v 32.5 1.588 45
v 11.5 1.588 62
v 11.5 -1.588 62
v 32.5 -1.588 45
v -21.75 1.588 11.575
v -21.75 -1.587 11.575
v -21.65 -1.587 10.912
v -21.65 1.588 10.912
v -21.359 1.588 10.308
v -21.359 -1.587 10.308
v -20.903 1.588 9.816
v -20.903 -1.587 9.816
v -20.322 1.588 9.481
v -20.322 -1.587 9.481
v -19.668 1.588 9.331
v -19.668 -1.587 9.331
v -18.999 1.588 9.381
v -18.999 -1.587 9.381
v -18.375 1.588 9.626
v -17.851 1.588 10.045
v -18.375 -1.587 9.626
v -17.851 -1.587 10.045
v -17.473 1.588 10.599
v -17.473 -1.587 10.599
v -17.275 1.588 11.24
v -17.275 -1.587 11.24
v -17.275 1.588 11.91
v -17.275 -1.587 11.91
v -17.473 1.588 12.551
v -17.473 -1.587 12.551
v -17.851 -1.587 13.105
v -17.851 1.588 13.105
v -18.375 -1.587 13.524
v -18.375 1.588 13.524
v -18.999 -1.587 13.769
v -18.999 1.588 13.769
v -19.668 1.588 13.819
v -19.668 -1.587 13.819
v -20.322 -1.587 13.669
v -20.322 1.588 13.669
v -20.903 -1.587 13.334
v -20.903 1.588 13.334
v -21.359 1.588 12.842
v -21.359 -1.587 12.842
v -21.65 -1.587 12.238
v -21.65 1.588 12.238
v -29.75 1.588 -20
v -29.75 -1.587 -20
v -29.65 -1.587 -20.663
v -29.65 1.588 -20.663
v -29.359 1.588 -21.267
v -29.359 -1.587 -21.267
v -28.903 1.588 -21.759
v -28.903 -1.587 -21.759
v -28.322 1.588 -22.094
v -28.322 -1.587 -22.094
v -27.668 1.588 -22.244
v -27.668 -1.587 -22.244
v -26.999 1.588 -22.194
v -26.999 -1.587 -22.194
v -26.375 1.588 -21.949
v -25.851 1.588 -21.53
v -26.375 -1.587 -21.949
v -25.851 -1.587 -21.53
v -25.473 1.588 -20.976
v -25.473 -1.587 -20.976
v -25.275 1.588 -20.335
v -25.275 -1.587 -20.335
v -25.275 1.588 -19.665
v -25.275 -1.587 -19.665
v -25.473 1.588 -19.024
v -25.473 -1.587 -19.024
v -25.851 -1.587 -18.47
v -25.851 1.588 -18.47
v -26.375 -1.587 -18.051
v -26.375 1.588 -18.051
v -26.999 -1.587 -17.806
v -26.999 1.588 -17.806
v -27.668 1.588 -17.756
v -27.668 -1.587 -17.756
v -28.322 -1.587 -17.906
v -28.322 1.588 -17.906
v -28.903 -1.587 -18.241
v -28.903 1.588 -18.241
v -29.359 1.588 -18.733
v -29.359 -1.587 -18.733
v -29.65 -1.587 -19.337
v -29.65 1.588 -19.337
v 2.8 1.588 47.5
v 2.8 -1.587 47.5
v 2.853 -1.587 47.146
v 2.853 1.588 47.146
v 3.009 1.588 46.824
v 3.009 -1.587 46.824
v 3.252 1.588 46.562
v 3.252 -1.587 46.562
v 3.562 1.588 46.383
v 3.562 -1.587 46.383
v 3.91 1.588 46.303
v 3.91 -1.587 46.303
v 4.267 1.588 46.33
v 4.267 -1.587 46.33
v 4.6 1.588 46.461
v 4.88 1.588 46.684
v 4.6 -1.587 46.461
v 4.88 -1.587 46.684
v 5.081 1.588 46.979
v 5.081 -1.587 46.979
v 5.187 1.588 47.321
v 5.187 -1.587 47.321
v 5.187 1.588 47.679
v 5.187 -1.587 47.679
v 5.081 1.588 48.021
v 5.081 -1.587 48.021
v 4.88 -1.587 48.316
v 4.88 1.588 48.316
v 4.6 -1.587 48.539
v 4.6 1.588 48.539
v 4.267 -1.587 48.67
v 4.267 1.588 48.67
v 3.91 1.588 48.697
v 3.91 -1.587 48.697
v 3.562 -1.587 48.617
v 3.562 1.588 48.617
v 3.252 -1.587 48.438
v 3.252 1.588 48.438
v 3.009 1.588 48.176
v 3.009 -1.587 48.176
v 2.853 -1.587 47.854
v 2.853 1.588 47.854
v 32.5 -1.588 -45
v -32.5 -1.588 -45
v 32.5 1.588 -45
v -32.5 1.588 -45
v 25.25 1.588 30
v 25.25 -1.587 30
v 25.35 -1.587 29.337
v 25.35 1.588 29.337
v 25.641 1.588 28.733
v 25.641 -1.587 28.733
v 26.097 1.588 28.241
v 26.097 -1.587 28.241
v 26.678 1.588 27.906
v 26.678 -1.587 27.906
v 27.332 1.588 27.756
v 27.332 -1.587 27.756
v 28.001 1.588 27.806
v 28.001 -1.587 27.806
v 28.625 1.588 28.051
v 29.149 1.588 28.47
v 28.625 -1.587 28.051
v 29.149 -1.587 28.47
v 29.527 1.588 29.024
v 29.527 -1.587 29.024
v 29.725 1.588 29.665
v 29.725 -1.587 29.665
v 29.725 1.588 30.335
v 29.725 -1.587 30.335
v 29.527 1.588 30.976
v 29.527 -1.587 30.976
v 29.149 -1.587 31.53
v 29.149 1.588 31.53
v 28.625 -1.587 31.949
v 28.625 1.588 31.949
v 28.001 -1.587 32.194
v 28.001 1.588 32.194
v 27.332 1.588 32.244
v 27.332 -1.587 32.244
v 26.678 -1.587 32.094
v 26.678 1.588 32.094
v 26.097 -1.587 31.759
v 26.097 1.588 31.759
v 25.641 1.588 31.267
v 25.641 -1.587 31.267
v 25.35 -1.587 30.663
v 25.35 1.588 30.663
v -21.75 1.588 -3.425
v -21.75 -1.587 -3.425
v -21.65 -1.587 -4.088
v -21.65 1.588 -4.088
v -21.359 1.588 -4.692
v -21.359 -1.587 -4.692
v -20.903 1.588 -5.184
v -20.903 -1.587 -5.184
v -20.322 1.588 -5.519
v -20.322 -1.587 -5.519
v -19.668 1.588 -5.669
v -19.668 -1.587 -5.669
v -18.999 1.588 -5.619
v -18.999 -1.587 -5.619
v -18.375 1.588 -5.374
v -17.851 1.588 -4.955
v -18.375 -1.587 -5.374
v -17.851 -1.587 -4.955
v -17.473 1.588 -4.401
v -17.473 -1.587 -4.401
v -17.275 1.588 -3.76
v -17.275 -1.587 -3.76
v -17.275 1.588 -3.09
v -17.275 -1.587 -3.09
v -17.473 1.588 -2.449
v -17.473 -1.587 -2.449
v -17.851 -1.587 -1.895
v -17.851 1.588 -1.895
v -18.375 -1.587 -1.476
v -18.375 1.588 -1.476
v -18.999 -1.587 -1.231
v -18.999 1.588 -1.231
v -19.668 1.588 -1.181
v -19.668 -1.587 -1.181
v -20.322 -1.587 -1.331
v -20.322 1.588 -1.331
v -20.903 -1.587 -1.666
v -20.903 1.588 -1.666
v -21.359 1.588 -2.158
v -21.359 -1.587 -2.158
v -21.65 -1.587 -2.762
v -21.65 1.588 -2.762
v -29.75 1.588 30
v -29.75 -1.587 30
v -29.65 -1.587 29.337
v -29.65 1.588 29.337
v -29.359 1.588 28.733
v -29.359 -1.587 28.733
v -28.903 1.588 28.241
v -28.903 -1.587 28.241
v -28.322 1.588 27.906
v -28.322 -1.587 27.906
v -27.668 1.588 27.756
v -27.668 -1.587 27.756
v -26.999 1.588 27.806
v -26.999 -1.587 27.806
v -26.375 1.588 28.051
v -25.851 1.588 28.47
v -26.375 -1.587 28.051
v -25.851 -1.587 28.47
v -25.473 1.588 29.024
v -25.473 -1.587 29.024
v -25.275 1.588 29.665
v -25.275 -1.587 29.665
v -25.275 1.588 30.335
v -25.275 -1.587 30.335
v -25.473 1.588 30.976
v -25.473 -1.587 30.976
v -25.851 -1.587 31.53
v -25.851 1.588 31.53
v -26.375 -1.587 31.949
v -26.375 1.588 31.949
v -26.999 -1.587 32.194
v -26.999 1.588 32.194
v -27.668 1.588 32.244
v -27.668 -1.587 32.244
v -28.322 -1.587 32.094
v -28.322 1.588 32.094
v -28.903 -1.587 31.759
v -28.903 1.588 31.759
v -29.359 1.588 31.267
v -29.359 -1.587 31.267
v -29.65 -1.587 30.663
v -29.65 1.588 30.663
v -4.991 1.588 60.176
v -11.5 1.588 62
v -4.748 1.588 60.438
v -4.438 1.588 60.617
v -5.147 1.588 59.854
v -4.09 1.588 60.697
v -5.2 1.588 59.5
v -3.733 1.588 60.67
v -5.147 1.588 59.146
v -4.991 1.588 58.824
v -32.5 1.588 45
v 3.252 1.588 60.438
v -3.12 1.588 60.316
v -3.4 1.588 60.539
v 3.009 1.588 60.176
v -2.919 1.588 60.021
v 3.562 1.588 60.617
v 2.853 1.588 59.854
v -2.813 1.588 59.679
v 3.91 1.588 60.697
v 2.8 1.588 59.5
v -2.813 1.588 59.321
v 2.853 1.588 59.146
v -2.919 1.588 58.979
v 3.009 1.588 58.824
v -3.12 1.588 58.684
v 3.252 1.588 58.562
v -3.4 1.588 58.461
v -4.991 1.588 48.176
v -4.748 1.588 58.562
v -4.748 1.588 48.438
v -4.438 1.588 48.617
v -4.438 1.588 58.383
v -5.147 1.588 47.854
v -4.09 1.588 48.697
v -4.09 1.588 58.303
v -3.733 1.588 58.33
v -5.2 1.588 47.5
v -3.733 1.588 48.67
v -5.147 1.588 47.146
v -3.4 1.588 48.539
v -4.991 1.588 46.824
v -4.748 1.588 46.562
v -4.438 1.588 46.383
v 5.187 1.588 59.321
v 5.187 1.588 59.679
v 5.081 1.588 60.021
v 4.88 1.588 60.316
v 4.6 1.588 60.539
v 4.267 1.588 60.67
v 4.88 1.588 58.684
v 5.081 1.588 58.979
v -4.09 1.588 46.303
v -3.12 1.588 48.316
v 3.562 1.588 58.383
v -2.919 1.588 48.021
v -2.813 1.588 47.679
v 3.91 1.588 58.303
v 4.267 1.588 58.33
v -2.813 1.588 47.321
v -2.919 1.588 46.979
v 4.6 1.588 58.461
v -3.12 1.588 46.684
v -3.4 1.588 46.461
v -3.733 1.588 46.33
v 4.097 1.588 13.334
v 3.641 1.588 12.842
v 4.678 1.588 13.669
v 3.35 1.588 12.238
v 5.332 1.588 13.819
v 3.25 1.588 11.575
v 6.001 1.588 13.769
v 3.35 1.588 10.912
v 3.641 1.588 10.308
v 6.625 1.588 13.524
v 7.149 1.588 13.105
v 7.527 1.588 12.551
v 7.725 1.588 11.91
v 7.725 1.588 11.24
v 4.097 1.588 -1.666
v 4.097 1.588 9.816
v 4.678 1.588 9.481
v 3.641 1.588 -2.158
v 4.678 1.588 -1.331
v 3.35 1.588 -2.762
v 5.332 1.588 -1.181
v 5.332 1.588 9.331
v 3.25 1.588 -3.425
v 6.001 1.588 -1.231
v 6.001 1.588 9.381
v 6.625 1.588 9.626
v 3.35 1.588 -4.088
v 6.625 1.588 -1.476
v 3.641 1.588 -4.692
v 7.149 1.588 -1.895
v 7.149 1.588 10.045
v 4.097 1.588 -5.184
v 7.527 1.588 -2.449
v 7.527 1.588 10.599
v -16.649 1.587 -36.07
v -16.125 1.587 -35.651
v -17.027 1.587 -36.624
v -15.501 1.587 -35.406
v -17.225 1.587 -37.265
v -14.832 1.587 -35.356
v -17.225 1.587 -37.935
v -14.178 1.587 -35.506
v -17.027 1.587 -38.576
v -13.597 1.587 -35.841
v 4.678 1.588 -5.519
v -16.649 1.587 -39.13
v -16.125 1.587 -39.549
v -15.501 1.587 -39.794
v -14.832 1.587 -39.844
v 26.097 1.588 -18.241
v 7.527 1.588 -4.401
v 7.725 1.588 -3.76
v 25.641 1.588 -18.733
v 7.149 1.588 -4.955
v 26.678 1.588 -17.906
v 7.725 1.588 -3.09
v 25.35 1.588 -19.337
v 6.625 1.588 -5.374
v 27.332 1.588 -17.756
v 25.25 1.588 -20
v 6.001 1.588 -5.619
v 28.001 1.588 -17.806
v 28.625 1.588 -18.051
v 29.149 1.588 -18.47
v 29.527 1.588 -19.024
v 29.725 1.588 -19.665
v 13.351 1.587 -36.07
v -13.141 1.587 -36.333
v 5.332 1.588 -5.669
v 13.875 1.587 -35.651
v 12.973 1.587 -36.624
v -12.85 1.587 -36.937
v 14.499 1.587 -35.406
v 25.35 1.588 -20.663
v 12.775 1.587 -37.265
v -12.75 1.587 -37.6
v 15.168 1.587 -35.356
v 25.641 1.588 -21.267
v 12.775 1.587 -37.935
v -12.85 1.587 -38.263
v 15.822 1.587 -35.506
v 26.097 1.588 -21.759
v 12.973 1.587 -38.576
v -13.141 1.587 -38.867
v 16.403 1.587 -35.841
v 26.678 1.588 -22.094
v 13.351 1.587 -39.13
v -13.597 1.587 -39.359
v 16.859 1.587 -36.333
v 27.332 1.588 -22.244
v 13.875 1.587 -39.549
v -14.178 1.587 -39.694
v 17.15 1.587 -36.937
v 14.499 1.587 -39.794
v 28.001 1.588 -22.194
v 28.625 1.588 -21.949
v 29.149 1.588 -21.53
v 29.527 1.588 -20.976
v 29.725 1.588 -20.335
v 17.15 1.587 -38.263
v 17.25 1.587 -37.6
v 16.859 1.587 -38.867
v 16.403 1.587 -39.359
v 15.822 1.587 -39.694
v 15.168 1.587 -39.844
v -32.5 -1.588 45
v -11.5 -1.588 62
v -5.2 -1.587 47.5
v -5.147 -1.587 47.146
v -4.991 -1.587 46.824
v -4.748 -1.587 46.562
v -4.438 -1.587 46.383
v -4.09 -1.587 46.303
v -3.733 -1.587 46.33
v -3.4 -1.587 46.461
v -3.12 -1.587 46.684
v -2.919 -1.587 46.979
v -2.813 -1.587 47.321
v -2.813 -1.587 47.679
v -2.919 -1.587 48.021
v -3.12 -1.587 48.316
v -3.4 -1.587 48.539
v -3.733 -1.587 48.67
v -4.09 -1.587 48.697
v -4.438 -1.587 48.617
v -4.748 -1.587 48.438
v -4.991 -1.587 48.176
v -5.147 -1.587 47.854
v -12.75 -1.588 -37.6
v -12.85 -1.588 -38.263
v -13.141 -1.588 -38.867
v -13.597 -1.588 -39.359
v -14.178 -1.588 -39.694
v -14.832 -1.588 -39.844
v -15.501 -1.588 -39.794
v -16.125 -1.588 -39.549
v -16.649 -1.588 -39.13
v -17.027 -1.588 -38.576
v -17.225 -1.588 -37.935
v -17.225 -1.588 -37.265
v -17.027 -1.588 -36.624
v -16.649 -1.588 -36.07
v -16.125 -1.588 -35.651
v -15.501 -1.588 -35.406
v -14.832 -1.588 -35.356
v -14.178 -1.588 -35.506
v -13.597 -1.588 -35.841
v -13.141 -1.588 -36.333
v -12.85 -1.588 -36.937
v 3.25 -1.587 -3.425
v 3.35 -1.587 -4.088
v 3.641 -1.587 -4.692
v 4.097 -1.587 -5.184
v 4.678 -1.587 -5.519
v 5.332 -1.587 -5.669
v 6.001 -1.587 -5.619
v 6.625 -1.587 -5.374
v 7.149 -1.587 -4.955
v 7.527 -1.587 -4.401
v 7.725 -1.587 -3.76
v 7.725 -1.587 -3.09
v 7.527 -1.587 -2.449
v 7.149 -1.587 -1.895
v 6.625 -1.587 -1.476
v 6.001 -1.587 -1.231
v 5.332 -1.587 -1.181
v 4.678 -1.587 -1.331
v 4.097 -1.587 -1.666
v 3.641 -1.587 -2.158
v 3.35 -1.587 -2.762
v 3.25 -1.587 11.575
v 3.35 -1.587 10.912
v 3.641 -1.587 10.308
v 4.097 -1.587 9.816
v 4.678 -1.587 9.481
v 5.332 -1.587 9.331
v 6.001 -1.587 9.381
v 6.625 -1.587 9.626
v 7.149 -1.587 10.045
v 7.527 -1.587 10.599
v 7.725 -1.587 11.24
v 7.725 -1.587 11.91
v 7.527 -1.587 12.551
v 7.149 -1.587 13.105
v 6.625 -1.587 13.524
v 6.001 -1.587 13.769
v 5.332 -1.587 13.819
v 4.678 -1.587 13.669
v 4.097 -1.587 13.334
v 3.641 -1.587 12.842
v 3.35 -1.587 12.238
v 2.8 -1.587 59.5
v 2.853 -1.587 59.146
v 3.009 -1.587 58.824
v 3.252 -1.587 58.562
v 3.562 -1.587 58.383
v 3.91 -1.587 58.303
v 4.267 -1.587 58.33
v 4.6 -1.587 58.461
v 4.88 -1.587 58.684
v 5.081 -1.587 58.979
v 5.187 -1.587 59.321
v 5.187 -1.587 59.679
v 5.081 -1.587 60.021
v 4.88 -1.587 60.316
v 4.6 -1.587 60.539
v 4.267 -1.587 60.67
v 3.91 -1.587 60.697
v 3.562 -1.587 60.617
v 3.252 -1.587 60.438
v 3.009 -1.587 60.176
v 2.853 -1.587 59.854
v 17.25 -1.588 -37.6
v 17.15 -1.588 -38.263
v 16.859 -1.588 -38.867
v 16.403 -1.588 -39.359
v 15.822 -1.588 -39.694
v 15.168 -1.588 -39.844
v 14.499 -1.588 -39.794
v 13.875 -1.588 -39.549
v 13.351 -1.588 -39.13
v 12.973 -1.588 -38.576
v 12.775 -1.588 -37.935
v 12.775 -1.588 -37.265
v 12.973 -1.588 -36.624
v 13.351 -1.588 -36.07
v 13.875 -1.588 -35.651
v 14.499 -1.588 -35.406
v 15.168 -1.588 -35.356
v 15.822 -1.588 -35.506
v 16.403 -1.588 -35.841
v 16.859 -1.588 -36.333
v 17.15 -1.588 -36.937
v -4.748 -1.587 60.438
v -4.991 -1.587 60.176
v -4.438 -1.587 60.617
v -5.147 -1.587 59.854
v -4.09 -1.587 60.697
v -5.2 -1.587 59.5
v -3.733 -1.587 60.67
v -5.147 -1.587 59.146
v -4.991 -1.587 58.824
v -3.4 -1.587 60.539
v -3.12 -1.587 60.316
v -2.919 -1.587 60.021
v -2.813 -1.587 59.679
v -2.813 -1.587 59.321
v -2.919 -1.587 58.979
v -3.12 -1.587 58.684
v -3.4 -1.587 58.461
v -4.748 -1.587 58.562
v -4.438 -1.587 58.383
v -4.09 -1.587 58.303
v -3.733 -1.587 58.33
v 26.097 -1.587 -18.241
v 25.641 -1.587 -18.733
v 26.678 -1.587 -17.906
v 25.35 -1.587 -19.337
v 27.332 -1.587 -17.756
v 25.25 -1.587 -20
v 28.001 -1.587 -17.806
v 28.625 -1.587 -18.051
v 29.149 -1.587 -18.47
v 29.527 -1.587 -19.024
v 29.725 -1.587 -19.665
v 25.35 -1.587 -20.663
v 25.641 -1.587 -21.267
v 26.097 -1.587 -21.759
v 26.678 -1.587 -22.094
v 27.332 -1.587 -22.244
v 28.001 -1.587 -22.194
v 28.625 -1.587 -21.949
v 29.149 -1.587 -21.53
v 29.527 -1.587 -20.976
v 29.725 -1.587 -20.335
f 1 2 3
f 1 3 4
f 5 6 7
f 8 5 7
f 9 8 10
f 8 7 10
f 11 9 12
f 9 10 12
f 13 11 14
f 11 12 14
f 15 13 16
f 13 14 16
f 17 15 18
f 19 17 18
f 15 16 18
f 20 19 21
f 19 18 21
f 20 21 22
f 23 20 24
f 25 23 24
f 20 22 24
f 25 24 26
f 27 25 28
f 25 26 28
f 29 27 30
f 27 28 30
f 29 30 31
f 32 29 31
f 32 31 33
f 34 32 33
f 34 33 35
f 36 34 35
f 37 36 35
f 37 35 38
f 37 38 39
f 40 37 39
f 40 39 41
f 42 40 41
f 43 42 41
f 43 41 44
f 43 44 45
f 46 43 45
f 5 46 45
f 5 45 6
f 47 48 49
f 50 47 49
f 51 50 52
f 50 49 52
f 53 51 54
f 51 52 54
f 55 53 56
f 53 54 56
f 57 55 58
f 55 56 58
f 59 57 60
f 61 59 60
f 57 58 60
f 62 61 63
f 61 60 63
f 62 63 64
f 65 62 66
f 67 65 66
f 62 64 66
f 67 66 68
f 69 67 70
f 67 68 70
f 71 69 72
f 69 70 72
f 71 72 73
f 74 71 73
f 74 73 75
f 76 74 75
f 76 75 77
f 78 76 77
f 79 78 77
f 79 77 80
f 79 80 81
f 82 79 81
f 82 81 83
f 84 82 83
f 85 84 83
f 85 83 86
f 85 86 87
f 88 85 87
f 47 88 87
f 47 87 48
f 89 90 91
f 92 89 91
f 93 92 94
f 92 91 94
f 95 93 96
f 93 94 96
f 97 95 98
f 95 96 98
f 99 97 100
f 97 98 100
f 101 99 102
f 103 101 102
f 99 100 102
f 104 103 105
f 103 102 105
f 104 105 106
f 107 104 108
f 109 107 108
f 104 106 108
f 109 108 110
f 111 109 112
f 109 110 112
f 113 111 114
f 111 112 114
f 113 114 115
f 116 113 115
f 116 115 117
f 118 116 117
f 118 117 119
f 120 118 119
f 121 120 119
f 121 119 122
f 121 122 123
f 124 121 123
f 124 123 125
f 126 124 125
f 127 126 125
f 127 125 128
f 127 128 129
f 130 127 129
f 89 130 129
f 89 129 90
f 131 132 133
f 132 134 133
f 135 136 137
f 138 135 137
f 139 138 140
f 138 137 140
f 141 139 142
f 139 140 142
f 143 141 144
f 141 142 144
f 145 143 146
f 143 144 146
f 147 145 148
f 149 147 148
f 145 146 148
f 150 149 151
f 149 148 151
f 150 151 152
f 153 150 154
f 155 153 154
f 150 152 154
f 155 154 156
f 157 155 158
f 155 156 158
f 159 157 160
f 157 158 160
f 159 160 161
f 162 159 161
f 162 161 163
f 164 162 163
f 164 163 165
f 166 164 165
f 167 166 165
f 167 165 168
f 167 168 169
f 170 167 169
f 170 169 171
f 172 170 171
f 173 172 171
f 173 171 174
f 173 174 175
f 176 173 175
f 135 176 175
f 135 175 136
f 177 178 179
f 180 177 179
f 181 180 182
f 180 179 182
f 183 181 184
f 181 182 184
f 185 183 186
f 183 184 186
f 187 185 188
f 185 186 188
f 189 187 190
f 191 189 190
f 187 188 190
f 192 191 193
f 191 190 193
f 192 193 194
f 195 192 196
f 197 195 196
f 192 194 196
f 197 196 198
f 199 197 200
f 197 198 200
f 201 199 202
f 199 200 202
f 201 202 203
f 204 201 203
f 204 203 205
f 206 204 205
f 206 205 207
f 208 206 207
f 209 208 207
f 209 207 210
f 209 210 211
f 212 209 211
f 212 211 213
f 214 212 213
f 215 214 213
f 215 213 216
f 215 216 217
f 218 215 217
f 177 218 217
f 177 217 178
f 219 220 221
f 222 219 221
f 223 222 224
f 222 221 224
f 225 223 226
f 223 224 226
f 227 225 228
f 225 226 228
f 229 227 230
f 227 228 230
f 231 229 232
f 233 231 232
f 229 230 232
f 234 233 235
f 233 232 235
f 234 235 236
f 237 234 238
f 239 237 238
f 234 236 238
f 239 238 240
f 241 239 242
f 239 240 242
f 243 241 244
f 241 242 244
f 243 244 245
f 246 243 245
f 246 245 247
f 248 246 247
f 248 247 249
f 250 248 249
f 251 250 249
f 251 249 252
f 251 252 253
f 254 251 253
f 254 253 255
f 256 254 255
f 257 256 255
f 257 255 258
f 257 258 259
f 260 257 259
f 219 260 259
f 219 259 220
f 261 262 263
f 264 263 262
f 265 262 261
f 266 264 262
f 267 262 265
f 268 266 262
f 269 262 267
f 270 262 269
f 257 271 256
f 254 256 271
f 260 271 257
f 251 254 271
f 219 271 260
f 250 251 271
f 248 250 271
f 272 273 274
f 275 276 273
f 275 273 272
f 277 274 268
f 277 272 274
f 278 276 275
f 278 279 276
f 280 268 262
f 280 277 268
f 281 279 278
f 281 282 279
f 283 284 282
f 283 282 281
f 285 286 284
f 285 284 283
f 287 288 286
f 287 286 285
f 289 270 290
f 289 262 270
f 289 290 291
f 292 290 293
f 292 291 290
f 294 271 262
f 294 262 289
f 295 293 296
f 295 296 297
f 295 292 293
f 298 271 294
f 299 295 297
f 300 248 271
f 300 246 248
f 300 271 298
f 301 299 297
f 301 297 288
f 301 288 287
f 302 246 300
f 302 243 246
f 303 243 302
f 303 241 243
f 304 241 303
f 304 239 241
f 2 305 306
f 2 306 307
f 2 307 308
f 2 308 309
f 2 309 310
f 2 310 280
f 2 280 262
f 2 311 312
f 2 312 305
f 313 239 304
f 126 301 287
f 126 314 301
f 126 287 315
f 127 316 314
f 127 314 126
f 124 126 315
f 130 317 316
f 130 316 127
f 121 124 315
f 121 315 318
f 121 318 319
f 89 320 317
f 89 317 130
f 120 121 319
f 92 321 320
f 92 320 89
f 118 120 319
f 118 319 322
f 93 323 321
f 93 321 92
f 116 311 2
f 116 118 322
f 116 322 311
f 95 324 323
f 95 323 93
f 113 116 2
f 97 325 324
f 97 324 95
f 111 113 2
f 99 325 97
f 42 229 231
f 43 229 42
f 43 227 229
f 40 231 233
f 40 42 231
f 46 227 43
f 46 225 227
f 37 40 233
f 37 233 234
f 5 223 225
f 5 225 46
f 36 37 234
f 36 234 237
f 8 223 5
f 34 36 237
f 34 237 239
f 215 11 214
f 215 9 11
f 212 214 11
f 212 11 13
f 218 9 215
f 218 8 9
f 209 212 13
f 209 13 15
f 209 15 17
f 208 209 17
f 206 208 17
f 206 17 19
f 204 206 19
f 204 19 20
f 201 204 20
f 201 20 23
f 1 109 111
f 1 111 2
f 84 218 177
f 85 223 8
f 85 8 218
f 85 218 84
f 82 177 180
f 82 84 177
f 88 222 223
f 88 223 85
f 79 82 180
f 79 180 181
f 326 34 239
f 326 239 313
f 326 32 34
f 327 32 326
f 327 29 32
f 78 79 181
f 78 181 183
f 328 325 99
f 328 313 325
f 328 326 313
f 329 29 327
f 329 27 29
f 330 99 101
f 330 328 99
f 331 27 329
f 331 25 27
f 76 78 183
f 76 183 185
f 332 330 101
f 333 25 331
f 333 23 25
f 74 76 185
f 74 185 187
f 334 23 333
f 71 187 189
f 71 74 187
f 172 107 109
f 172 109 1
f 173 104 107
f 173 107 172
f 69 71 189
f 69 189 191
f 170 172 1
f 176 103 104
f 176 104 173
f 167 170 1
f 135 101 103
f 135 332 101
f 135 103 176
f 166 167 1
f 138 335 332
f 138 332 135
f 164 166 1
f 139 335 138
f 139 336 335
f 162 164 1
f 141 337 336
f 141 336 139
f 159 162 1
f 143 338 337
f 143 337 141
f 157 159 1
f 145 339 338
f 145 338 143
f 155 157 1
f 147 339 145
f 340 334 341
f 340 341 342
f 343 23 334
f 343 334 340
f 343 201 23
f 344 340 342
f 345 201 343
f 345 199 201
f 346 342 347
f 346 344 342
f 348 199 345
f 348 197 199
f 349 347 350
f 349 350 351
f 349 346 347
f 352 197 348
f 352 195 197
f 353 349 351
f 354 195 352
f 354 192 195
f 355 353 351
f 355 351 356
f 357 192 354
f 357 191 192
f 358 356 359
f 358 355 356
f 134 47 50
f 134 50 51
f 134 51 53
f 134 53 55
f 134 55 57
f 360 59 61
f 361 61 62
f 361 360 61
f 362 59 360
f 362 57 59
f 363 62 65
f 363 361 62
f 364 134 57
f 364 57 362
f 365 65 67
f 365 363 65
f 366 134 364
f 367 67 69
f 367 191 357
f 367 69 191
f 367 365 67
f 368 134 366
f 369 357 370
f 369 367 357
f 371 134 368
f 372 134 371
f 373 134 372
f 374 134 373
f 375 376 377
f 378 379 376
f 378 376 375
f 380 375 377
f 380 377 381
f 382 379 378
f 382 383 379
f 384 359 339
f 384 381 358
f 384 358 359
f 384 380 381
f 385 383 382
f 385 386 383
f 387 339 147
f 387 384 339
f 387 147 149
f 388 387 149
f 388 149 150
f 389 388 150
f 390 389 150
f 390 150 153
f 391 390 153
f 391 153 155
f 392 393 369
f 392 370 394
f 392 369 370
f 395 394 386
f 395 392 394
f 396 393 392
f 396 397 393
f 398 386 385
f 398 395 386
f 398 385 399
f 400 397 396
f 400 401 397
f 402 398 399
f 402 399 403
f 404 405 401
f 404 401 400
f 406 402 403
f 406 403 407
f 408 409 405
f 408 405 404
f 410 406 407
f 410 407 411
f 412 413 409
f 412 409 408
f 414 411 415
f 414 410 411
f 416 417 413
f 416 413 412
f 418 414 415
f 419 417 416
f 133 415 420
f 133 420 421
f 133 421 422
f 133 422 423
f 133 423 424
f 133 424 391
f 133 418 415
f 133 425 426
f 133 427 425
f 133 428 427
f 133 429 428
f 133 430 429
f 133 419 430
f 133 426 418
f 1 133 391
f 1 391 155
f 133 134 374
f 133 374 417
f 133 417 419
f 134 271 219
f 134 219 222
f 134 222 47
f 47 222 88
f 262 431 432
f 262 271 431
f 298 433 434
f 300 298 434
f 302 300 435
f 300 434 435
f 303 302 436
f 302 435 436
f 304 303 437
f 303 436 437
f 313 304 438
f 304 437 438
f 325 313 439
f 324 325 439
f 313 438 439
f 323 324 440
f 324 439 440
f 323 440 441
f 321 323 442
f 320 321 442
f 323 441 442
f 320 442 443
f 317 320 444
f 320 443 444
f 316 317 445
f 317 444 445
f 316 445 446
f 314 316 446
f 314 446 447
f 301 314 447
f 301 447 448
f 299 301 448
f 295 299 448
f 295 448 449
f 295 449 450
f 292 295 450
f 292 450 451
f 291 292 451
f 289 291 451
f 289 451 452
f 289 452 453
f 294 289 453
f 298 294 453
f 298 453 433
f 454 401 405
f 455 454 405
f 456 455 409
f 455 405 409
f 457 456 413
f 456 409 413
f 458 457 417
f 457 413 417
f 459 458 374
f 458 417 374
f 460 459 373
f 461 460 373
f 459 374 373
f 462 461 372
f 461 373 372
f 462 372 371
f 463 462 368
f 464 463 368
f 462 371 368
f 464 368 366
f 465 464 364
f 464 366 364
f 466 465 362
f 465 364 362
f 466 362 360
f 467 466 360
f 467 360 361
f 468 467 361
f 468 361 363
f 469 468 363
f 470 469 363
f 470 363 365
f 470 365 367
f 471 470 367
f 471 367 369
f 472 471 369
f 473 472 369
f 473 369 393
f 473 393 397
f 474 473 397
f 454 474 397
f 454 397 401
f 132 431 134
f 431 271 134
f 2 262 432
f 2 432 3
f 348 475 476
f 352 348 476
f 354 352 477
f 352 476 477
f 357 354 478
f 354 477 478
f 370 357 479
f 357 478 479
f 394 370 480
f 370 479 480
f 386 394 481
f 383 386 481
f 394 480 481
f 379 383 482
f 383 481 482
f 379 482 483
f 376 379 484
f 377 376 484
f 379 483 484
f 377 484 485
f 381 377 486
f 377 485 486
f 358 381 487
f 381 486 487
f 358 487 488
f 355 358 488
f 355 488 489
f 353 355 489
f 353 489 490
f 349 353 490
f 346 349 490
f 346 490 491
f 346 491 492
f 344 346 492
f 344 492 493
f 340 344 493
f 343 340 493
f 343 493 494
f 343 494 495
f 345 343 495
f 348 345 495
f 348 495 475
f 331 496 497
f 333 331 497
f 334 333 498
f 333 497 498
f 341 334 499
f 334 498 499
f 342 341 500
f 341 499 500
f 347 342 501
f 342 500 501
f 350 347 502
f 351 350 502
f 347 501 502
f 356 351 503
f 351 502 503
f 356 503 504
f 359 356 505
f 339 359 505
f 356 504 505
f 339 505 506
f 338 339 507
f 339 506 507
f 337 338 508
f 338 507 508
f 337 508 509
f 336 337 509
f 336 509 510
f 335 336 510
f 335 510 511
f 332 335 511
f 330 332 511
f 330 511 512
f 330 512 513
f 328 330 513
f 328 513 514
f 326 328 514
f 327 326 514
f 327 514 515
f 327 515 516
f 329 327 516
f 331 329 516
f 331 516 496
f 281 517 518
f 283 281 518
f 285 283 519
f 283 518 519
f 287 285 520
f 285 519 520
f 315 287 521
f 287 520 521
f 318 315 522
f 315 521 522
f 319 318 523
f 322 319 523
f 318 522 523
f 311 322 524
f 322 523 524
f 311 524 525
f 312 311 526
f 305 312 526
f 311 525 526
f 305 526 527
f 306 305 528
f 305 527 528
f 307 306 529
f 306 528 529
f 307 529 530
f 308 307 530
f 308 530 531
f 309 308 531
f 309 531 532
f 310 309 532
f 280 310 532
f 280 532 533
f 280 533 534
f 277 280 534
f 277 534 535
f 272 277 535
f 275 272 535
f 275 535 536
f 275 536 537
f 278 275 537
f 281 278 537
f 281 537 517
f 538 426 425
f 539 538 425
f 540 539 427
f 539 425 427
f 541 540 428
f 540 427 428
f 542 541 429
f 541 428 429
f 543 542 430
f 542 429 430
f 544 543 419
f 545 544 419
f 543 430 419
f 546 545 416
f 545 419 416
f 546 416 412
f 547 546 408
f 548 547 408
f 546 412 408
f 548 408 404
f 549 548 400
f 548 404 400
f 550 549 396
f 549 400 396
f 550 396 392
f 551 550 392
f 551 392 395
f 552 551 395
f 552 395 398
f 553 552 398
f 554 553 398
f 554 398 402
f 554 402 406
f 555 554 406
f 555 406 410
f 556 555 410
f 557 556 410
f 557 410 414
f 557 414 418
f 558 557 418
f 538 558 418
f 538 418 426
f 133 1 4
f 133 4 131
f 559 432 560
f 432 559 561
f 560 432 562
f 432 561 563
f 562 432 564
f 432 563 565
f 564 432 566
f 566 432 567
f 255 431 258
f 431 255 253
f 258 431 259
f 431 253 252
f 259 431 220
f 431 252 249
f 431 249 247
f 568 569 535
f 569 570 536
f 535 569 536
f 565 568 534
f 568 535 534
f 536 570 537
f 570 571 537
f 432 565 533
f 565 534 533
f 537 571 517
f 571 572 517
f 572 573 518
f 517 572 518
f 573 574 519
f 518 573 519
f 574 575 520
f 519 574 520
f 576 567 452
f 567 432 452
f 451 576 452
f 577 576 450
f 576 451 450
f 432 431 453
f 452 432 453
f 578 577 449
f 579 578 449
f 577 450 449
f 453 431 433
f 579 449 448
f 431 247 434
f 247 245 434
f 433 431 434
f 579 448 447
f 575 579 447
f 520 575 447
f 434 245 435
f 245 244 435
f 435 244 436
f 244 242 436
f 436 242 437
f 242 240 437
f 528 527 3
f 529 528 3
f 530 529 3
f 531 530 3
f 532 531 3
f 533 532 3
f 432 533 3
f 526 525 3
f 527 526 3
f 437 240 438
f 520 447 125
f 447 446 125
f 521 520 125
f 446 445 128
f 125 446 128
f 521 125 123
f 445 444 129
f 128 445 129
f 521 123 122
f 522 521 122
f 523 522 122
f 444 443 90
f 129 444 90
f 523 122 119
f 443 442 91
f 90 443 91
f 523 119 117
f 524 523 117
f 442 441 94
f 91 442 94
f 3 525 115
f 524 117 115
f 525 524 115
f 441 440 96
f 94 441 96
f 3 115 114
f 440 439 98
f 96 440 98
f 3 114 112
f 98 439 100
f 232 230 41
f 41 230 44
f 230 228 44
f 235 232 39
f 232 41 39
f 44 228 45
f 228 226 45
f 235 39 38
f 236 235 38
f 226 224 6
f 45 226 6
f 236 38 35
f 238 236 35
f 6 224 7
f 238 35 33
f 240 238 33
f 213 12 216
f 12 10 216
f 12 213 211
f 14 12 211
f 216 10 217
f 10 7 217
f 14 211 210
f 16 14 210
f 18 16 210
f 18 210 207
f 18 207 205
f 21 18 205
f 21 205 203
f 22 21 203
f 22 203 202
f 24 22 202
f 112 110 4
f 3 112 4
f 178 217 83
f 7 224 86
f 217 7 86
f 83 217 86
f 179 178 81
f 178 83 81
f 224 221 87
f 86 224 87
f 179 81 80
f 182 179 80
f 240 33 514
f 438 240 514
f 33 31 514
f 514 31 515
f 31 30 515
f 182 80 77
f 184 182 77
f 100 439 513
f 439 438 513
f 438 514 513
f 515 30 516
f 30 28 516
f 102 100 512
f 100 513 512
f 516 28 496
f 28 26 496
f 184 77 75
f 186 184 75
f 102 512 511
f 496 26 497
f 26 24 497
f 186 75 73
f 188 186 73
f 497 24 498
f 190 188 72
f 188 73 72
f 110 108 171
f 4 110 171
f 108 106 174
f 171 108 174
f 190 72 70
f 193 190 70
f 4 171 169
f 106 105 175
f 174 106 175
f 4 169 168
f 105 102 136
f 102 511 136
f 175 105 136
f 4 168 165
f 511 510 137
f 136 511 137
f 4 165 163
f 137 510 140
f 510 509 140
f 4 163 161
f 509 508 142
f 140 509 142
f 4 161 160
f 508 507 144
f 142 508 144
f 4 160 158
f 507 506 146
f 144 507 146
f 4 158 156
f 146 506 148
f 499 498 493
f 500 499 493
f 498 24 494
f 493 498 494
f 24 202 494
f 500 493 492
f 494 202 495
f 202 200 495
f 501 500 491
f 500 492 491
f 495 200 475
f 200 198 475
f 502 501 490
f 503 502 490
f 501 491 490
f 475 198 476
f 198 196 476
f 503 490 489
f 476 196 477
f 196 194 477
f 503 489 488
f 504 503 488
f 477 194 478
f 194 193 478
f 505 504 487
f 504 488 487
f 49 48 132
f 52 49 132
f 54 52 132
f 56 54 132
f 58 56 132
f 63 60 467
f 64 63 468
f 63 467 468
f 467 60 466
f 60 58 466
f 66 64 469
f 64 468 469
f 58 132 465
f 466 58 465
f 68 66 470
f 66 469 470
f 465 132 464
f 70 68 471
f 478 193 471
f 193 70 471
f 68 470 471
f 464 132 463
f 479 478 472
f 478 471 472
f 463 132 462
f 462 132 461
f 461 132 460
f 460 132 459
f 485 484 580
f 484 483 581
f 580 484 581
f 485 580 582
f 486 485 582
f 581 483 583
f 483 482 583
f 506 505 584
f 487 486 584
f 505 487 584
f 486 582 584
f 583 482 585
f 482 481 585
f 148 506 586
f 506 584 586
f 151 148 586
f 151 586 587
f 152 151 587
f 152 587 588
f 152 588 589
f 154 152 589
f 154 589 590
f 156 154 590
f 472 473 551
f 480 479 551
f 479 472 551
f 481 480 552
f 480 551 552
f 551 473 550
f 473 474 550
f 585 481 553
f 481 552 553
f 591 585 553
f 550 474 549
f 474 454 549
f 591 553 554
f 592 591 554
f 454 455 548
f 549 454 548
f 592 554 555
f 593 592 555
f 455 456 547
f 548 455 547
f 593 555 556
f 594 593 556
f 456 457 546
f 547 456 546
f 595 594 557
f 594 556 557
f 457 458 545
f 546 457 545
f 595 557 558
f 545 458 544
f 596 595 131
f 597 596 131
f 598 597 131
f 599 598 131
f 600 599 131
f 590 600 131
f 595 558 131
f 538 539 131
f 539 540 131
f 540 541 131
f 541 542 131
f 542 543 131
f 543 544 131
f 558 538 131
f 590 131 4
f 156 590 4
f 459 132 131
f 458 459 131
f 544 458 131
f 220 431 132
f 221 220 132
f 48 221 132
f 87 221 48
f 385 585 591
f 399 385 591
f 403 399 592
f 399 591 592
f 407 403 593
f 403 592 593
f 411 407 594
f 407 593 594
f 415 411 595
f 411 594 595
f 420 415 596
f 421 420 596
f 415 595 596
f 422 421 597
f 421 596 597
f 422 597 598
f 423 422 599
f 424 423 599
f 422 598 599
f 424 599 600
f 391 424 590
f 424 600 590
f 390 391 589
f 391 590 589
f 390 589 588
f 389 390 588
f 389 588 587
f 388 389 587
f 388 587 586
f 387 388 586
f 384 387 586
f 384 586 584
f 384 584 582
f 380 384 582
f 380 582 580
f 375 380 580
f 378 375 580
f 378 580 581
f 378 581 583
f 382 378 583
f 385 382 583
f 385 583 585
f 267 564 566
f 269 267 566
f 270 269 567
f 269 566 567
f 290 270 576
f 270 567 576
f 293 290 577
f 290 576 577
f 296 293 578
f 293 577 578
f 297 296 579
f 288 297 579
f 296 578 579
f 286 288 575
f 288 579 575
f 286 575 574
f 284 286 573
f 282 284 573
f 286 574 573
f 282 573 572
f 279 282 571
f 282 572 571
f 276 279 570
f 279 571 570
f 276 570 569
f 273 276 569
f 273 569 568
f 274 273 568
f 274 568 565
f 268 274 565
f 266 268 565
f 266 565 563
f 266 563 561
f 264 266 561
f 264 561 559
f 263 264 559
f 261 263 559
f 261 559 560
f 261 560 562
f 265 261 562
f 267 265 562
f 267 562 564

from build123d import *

# Parameters (mm, degrees)
SKETCH1_W            = 65
SKETCH1_H            = 90
SKETCH1_W_2          = 23
SKETCH1_H_2          = 17
BOSS_EXTRUDE1_DEPTH  = 1.5875
M2_CLEARANCE_HOLE1_D = 2.4
M4_CLEARANCE_HOLE1_D = 4.5
M4_CLEARANCE_HOLE2_D = 4.5
M4_CLEARANCE_HOLE3_D = 4.5


with BuildPart() as part:
    # Sketch1 → Boss-Extrude1 (new body, symmetric)
    with BuildSketch(Plane(origin=(0, 0, 0), x_dir=(1, 0, 0), z_dir=(0, 1, 0))):
        Polygon((-32.5, -45), (-11.5, -62), (-11.5, -45), align=None)
        Polygon((11.5, -45), (11.5, -62), (32.5, -45), align=None)
        Rectangle(SKETCH1_W, SKETCH1_H)
        with Locations((0, -53.5)):
            Rectangle(SKETCH1_W_2, SKETCH1_H_2)
    extrude(amount=BOSS_EXTRUDE1_DEPTH, both=True)

    # M2 Clearance Hole1 (through all)
    with Locations(Plane(origin=(0, 1.5875, 0), x_dir=(1, 0, 0), z_dir=(0, 1, 0))):
        with Locations((-4, -59.5), (4, -59.5), (4, -47.5), (-4, -47.5)):
            Hole(M2_CLEARANCE_HOLE1_D / 2)

    # M4 Clearance Hole1 (through all)
    with Locations(Plane(origin=(0, 1.5875, 0), x_dir=(1, 0, 0), z_dir=(0, 1, 0))):
        with Locations((-27.5, 20), (27.5, 20), (27.5, -30), (-27.5, -30)):
            Hole(M4_CLEARANCE_HOLE1_D / 2)

    # M4 Clearance Hole2 (through all)
    with Locations(Plane(origin=(0, 1.5875, 0), x_dir=(1, 0, 0), z_dir=(0, 1, 0))):
        with Locations((-19.5, -11.575), (-19.5, 3.425), (5.5, 3.425), (5.5, -11.575)):
            Hole(M4_CLEARANCE_HOLE2_D / 2)

    # M4 Clearance Hole3 (through all)
    with Locations(Plane(origin=(0, -1.5875, 0), x_dir=(-1, 0, 0), z_dir=(0, -1, 0))):
        with Locations((-15, 37.6), (15, 37.6)):
            Hole(M4_CLEARANCE_HOLE3_D / 2)


solid = part.part
